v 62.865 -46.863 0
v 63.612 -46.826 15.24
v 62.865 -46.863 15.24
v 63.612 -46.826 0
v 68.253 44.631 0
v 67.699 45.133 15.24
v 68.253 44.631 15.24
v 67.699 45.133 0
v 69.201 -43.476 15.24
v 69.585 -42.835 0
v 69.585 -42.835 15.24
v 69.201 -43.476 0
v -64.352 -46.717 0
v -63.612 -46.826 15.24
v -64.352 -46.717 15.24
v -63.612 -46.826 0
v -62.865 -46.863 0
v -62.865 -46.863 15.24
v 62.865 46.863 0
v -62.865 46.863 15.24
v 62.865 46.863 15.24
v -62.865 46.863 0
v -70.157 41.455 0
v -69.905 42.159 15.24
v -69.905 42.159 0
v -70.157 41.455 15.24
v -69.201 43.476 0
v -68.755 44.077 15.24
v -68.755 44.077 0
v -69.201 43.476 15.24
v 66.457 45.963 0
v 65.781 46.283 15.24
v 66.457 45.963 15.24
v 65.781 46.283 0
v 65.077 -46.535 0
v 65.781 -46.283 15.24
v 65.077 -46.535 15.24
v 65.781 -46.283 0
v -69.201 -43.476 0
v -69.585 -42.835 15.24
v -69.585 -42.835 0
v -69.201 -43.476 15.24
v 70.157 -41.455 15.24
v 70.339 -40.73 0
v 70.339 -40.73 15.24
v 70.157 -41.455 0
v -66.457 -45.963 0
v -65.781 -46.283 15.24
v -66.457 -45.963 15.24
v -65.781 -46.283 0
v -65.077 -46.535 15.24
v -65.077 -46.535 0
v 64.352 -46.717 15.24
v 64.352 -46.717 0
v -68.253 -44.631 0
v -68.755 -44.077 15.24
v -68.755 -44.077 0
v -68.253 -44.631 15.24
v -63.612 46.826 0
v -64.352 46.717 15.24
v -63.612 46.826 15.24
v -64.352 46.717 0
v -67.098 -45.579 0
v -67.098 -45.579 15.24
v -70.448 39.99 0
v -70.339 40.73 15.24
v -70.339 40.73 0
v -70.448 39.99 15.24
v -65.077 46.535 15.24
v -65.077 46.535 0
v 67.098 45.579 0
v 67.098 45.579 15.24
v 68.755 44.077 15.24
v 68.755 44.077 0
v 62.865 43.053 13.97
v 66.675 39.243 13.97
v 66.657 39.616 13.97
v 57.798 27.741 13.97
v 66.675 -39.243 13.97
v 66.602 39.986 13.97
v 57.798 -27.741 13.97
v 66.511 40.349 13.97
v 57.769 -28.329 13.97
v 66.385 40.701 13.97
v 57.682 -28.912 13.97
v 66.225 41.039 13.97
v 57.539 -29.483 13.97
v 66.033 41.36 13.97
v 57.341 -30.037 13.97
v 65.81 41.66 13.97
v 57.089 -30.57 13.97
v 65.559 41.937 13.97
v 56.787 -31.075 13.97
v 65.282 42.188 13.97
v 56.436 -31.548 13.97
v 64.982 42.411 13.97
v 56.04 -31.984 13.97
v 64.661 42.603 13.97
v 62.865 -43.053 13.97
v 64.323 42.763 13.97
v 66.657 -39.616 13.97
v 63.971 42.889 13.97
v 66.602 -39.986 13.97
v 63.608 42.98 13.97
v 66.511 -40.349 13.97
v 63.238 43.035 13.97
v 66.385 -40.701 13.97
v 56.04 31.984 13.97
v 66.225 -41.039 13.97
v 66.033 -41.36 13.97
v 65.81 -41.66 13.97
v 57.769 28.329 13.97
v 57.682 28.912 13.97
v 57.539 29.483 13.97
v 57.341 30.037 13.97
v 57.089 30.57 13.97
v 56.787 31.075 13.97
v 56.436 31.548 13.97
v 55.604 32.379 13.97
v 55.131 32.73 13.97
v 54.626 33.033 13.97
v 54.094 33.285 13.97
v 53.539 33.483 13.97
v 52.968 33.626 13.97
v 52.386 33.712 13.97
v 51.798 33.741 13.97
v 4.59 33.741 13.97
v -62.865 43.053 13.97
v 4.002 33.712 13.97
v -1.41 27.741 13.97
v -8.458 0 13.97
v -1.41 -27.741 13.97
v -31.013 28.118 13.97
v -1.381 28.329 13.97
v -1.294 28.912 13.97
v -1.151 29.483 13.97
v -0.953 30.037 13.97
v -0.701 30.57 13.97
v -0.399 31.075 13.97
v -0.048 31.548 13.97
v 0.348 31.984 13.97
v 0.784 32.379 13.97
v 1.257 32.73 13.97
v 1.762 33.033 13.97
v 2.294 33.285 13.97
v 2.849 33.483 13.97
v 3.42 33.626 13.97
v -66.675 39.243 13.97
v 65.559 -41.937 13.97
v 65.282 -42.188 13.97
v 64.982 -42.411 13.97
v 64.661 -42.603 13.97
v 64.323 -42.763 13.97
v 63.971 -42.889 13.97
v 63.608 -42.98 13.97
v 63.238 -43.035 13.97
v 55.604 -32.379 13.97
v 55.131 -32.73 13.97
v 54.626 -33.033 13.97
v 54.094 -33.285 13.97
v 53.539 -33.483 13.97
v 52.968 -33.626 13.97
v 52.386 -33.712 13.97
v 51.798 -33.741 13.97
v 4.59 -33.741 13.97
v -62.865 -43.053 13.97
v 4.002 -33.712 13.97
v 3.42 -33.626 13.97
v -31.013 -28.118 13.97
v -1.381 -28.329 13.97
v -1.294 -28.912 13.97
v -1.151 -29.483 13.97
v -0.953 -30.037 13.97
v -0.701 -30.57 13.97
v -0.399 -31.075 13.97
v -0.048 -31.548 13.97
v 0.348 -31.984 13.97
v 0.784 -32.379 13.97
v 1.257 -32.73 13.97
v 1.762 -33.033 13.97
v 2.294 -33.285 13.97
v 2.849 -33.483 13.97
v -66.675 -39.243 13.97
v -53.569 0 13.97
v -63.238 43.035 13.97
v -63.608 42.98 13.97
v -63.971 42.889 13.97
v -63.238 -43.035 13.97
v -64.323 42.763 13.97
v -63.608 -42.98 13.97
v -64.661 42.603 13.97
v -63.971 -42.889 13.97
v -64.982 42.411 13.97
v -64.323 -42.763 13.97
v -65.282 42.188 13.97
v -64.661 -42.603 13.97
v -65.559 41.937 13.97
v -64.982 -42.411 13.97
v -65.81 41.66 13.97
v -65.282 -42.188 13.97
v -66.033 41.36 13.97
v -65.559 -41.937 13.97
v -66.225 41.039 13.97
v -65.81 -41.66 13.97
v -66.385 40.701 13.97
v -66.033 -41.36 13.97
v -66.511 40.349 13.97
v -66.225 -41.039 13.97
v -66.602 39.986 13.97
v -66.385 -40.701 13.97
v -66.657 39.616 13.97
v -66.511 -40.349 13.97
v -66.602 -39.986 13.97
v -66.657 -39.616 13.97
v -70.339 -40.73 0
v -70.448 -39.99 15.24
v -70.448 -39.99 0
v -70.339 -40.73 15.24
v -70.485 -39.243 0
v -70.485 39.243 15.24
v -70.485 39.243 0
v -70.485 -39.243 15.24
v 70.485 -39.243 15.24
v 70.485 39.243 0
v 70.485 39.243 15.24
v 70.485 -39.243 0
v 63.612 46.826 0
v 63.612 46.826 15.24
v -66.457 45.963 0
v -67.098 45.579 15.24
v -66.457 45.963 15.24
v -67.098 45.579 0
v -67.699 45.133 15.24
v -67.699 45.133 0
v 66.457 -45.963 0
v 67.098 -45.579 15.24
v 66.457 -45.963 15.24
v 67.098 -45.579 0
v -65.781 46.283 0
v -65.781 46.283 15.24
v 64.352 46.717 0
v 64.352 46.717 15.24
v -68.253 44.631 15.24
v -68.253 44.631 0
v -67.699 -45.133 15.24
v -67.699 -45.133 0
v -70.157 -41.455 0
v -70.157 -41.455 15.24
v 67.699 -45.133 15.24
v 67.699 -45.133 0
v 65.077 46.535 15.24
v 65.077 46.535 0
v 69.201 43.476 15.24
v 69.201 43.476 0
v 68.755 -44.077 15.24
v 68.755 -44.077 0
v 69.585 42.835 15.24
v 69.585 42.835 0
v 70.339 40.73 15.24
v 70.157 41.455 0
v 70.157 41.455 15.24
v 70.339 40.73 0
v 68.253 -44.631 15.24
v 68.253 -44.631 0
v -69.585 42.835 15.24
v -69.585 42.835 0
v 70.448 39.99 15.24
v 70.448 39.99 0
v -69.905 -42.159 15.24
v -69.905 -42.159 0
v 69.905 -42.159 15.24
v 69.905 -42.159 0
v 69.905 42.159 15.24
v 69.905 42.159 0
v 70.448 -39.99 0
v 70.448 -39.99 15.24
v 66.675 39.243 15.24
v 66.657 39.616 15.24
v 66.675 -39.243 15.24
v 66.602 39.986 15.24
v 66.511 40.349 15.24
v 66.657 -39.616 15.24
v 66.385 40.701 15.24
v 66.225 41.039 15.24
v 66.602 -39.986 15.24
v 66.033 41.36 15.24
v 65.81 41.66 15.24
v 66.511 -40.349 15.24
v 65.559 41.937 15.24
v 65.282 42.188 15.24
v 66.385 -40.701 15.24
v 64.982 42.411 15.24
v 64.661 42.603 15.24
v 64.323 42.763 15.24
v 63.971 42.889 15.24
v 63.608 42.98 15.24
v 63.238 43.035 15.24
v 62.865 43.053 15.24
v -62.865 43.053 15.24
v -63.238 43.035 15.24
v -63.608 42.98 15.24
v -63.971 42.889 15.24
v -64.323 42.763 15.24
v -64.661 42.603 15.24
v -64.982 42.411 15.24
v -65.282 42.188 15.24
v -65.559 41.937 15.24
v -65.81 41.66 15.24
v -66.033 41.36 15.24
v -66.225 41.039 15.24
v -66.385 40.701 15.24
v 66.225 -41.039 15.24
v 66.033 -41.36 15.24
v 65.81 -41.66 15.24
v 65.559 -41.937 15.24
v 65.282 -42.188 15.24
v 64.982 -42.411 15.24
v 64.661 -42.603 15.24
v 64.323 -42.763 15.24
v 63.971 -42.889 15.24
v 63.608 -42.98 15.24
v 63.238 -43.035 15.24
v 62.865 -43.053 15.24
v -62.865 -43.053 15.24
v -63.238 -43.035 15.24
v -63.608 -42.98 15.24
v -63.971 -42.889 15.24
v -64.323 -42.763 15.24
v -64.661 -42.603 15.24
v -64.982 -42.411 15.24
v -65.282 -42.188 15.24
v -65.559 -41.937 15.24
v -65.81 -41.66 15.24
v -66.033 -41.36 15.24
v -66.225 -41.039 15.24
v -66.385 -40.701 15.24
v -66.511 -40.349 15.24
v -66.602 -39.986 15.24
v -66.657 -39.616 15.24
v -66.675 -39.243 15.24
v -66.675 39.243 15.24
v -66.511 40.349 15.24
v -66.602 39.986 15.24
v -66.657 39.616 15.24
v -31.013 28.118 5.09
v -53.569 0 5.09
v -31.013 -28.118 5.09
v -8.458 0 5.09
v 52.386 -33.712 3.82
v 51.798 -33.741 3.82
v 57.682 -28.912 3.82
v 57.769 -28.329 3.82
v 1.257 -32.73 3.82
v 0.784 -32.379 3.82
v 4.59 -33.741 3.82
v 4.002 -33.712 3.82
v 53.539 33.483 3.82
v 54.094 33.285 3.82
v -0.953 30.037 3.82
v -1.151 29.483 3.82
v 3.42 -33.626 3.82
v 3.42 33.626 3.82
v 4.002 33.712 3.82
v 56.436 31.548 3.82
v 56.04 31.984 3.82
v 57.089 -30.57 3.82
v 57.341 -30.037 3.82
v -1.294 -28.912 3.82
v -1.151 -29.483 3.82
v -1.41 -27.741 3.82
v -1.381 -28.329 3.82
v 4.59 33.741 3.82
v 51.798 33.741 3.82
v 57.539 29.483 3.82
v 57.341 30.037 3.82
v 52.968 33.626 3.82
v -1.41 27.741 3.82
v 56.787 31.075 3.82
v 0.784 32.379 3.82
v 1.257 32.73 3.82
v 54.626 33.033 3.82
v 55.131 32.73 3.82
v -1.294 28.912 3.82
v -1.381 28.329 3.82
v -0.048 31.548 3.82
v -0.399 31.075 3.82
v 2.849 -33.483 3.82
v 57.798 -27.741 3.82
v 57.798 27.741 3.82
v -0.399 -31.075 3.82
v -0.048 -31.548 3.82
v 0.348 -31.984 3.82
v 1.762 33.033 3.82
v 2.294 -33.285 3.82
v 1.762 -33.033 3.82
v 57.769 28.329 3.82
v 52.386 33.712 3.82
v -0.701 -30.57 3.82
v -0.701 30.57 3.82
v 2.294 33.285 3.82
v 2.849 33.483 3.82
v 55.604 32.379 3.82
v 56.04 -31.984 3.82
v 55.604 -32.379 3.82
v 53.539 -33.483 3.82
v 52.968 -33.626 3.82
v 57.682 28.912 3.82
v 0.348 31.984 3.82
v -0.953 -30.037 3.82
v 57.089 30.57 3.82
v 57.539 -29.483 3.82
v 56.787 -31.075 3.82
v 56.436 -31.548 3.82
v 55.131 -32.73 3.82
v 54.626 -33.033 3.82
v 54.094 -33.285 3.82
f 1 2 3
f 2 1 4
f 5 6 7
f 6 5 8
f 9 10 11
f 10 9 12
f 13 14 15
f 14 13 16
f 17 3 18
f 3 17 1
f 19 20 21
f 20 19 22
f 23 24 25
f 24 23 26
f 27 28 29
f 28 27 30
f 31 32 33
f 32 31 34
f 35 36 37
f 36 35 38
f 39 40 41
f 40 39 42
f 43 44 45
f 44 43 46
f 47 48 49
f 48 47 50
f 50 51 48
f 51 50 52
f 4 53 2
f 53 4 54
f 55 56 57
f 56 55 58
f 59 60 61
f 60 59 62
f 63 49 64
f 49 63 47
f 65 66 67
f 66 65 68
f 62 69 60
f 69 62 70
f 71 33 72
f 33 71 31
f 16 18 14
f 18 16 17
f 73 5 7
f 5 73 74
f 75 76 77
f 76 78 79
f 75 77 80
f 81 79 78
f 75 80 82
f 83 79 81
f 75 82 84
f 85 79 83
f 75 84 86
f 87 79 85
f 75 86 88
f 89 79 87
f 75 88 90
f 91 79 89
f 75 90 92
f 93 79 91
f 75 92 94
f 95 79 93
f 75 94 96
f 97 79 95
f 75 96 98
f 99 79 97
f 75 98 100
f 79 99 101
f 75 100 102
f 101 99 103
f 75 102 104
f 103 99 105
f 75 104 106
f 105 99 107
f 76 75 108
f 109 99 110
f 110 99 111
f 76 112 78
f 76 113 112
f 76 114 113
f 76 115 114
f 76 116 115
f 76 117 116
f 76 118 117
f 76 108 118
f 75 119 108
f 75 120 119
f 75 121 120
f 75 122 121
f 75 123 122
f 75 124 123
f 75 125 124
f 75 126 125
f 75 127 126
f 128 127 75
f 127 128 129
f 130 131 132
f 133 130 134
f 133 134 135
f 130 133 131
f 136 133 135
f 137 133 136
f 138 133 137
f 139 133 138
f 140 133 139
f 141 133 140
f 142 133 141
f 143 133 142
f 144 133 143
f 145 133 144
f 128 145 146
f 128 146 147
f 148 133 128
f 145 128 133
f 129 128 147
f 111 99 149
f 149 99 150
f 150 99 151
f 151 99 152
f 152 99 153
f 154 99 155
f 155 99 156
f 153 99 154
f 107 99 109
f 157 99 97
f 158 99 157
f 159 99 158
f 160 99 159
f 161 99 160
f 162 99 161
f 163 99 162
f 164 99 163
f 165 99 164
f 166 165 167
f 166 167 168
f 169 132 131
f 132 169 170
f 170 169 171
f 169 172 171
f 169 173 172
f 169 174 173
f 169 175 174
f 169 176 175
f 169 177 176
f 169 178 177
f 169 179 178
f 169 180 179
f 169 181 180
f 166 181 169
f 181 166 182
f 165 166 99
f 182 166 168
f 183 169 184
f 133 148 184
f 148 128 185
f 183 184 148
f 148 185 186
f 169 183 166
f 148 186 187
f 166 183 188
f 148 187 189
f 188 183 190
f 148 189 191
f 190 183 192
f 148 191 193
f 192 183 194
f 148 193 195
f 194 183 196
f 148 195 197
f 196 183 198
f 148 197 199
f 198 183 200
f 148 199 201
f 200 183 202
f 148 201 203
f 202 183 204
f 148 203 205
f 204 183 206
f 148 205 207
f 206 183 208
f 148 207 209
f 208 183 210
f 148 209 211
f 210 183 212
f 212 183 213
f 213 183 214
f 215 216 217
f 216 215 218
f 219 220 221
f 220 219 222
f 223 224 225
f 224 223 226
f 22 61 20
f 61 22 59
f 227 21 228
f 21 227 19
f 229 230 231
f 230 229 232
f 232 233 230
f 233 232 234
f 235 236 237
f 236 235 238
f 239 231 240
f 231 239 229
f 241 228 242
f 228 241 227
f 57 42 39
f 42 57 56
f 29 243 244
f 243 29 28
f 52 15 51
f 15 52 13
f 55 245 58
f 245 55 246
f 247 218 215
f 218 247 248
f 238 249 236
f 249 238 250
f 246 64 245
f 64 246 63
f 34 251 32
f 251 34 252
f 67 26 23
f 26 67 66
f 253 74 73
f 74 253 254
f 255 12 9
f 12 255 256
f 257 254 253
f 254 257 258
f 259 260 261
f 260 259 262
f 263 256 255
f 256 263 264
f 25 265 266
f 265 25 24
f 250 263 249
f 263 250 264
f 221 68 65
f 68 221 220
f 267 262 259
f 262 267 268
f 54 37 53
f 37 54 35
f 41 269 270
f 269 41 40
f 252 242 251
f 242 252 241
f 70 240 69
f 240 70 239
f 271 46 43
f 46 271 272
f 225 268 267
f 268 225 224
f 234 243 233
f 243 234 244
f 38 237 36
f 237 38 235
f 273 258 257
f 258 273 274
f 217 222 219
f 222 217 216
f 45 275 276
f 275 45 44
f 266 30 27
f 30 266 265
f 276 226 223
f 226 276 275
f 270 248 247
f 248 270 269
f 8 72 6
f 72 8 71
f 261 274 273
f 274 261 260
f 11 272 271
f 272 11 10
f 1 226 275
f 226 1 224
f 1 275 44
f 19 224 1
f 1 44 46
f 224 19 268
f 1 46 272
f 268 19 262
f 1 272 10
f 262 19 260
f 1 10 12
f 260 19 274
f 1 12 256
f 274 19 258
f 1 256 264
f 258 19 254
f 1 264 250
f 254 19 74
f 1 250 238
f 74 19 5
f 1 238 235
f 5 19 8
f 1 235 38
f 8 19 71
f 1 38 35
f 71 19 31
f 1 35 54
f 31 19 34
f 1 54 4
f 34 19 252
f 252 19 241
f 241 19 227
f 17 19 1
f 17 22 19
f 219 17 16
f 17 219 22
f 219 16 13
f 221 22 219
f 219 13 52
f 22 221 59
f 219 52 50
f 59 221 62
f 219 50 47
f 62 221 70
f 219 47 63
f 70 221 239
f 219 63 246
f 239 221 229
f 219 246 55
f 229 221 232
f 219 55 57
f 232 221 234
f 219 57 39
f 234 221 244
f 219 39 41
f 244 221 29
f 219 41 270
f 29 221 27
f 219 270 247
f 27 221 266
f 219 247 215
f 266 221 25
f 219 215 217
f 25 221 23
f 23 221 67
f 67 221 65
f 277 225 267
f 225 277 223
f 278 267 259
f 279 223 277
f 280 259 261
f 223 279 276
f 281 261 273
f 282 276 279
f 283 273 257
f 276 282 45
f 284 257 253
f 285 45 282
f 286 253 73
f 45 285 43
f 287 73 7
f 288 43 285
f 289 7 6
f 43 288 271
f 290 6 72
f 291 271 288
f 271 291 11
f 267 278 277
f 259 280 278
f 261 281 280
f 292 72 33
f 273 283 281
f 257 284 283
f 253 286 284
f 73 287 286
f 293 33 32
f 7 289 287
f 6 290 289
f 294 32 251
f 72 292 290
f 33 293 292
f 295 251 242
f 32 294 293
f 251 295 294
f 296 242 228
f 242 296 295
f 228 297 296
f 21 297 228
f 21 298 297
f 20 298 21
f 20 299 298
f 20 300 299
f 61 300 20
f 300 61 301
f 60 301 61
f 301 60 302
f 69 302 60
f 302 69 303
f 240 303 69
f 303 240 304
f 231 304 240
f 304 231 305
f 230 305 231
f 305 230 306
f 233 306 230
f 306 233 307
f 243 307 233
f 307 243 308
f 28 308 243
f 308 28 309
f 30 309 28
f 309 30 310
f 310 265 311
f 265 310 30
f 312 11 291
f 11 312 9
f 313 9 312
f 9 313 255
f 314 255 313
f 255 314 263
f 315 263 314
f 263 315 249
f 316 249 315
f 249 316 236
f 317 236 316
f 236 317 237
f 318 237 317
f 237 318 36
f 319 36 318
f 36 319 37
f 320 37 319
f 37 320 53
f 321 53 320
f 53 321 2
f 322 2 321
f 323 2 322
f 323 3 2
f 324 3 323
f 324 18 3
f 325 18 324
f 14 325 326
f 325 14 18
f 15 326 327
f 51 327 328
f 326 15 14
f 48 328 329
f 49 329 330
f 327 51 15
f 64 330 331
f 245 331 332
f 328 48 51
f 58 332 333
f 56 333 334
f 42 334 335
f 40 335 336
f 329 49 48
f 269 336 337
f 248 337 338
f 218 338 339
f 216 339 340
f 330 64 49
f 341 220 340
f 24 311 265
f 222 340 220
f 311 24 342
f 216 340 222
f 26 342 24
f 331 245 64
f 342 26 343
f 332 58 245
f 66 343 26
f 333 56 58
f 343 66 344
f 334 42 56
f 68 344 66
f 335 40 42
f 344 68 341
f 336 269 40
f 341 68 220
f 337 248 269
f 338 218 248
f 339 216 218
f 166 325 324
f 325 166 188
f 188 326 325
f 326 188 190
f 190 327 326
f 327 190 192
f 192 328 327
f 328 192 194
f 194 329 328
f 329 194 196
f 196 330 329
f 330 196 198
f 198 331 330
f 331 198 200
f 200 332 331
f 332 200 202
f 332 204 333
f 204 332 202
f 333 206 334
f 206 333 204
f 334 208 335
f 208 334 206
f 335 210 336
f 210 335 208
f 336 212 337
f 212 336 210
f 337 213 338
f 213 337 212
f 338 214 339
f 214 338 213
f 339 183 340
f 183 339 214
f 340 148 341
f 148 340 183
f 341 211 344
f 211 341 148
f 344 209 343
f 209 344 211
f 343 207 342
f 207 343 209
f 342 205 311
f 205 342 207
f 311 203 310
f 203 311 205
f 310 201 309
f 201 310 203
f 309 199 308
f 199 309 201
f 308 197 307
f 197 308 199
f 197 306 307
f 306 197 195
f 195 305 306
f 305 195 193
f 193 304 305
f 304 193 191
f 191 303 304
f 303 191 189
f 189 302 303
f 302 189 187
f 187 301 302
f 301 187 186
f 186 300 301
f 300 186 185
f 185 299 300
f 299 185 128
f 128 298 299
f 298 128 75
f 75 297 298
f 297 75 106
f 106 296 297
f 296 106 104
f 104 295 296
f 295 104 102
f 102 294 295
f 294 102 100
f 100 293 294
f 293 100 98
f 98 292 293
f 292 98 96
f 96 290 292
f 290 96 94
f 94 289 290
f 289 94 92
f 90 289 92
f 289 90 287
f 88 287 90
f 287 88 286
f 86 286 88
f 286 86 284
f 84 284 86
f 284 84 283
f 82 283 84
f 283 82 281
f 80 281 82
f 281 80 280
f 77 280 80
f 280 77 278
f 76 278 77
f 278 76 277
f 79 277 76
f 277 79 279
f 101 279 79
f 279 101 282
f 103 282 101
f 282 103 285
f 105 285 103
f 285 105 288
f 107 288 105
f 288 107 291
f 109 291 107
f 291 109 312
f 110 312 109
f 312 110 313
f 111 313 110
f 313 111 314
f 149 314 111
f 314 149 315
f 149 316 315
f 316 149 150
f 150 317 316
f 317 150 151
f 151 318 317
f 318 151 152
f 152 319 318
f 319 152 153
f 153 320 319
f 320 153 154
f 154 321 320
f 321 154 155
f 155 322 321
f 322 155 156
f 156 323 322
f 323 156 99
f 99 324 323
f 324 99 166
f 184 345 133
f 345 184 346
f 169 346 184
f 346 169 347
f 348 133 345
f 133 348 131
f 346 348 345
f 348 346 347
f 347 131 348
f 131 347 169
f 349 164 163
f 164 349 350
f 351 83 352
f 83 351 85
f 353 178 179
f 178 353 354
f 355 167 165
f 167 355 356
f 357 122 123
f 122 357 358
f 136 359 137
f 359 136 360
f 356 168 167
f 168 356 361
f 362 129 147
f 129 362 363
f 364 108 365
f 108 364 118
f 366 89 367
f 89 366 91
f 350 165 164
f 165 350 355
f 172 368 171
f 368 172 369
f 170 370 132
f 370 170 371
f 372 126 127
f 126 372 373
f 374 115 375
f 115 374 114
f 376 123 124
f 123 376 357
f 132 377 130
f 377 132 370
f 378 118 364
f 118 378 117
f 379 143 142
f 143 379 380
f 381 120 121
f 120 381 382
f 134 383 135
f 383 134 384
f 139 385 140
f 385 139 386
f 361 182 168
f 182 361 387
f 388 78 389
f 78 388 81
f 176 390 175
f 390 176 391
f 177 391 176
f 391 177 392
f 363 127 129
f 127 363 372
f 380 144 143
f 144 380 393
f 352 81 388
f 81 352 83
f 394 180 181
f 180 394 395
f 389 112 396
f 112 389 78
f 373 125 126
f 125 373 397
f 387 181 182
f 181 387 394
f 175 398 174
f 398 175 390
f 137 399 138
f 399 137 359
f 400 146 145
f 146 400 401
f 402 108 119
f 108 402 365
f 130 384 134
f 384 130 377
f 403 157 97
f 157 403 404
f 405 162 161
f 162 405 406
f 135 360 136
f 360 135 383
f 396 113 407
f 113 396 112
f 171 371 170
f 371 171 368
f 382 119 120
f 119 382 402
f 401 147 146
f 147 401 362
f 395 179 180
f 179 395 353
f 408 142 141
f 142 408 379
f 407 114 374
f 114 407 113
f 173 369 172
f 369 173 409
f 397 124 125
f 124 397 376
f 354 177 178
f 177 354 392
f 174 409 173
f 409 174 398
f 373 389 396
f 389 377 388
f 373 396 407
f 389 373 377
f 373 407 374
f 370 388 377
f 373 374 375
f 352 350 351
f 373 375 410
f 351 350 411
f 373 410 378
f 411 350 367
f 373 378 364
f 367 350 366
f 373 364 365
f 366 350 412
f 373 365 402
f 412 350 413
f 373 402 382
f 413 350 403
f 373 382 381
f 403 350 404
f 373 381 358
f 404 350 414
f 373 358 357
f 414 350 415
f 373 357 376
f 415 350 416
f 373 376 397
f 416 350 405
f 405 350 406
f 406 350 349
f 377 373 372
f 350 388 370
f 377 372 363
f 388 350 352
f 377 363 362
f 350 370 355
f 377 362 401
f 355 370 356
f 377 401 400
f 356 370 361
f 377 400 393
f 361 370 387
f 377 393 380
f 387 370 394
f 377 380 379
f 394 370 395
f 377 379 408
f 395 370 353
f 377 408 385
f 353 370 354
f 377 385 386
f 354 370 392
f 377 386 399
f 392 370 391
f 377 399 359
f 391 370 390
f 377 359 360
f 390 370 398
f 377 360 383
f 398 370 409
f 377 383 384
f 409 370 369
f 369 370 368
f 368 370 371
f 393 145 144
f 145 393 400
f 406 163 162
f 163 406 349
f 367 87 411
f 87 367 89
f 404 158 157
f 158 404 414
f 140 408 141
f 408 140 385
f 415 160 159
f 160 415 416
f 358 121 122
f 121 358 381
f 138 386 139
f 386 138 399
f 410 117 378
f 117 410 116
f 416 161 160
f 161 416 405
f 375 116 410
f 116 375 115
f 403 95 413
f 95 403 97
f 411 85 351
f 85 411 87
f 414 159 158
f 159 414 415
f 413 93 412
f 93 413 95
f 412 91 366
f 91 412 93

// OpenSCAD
// ====================================================================
// SOUL IDENTIFICATION RUNE (SIR) - BASE SLAB GENERATOR
// Aurphyx Primordial Standards (APS) - Parametric Specification
// ====================================================================

/* [Rune Dimensions (Inches)] */
rune_width_in      = 5.55;  // Default landscape width
rune_height_in     = 3.69;  // Default landscape height
rune_thickness_in  = 0.55;  // 0.55" depth for large SKIM chamber

/* [Inlay Pocket Depths (Inches)] */
birthstone_depth_in = 0.35; // Recess for diamond birthstone
skim_depth_in       = 0.40; // Deep chamber for SKIM fluid & quartz

/* [Styling & Resolution] */
corner_radius_in   = 0.30;  // Corner roundness of the main rune
border_width_in    = 0.15;  // Width of outer ornate border trim
border_height_in   = 0.05;  // Height of raised metallic trim above stone
$fn = 64;                   // Rendering smoothness

// --- CONVERSIONS (Inches to Millimeters for OpenSCAD rendering) ---
mm = 25.4;
w  = rune_width_in * mm;
h  = rune_height_in * mm;
t  = rune_thickness_in * mm;
r  = corner_radius_in * mm;
bs_d = birthstone_depth_in * mm;
skim_d = skim_depth_in * mm;
b_w = border_width_in * mm;
b_h = border_height_in * mm;

// --- MAIN ASSEMBLY ---
module SIR_Rune() {
    difference() {
        union() {
            // Base Stone Body
            rounded_slab(w, h, t, r);
            
            // Raised Outer Filigree/Border Trim
            translate([0, 0, t])
                border_trim(w, h, r, b_w, b_h);
        }
        
        // 1. Birthstone Diamond Pocket (Left Side)
        translate([-w*0.22, 0, t - bs_d + 0.01])
            diamond_pocket(w*0.32, h*0.60, bs_d + b_h + 1);
            
        // 2. SKIM Chamber Pocket (Right Side - Large for Bio-reactive Fluid)
        translate([w*0.20, 0, t - skim_d + 0.01])
            skim_chamber(w*0.42, h*0.72, skim_d + b_h + 1, 6);
    }
}

// --- HELPER MODULES ---

// Rounded Rectangular Slab
module rounded_slab(width, height, thickness, radius) {
    linear_extrude(height = thickness) {
        offset(r = radius) {
            square([width - 2*radius, height - 2*radius], center = true);
        }
    }
}

// Raised Outer Trim
module border_trim(width, height, radius, width_trim, height_trim) {
    linear_extrude(height = height_trim) {
        difference() {
            offset(r = radius)
                square([width - 2*radius, height - 2*radius], center = true);
            offset(r = radius - width_trim)
                square([width - 2*radius, height - 2*radius], center = true);
        }
    }
}

// Diamond-Shaped Cavity for Birthstone
module diamond_pocket(dia_w, dia_h, depth) {
    linear_extrude(height = depth) {
        polygon(points = [
            [0, dia_h/2],
            [dia_w/2, 0],
            [0, -dia_h/2],
            [-dia_w/2, 0]
        ]);
    }
}

// SKIM Fluid/Quartz Chamber (Rounded Pocket)
module skim_chamber(ch_w, ch_h, depth, corner_r) {
    linear_extrude(height = depth) {
        offset(r = corner_r) {
            square([ch_w - 2*corner_r, ch_h - 2*corner_r], center = true);
        }
    }
}

// Render the Rune
SIR_Rune();
